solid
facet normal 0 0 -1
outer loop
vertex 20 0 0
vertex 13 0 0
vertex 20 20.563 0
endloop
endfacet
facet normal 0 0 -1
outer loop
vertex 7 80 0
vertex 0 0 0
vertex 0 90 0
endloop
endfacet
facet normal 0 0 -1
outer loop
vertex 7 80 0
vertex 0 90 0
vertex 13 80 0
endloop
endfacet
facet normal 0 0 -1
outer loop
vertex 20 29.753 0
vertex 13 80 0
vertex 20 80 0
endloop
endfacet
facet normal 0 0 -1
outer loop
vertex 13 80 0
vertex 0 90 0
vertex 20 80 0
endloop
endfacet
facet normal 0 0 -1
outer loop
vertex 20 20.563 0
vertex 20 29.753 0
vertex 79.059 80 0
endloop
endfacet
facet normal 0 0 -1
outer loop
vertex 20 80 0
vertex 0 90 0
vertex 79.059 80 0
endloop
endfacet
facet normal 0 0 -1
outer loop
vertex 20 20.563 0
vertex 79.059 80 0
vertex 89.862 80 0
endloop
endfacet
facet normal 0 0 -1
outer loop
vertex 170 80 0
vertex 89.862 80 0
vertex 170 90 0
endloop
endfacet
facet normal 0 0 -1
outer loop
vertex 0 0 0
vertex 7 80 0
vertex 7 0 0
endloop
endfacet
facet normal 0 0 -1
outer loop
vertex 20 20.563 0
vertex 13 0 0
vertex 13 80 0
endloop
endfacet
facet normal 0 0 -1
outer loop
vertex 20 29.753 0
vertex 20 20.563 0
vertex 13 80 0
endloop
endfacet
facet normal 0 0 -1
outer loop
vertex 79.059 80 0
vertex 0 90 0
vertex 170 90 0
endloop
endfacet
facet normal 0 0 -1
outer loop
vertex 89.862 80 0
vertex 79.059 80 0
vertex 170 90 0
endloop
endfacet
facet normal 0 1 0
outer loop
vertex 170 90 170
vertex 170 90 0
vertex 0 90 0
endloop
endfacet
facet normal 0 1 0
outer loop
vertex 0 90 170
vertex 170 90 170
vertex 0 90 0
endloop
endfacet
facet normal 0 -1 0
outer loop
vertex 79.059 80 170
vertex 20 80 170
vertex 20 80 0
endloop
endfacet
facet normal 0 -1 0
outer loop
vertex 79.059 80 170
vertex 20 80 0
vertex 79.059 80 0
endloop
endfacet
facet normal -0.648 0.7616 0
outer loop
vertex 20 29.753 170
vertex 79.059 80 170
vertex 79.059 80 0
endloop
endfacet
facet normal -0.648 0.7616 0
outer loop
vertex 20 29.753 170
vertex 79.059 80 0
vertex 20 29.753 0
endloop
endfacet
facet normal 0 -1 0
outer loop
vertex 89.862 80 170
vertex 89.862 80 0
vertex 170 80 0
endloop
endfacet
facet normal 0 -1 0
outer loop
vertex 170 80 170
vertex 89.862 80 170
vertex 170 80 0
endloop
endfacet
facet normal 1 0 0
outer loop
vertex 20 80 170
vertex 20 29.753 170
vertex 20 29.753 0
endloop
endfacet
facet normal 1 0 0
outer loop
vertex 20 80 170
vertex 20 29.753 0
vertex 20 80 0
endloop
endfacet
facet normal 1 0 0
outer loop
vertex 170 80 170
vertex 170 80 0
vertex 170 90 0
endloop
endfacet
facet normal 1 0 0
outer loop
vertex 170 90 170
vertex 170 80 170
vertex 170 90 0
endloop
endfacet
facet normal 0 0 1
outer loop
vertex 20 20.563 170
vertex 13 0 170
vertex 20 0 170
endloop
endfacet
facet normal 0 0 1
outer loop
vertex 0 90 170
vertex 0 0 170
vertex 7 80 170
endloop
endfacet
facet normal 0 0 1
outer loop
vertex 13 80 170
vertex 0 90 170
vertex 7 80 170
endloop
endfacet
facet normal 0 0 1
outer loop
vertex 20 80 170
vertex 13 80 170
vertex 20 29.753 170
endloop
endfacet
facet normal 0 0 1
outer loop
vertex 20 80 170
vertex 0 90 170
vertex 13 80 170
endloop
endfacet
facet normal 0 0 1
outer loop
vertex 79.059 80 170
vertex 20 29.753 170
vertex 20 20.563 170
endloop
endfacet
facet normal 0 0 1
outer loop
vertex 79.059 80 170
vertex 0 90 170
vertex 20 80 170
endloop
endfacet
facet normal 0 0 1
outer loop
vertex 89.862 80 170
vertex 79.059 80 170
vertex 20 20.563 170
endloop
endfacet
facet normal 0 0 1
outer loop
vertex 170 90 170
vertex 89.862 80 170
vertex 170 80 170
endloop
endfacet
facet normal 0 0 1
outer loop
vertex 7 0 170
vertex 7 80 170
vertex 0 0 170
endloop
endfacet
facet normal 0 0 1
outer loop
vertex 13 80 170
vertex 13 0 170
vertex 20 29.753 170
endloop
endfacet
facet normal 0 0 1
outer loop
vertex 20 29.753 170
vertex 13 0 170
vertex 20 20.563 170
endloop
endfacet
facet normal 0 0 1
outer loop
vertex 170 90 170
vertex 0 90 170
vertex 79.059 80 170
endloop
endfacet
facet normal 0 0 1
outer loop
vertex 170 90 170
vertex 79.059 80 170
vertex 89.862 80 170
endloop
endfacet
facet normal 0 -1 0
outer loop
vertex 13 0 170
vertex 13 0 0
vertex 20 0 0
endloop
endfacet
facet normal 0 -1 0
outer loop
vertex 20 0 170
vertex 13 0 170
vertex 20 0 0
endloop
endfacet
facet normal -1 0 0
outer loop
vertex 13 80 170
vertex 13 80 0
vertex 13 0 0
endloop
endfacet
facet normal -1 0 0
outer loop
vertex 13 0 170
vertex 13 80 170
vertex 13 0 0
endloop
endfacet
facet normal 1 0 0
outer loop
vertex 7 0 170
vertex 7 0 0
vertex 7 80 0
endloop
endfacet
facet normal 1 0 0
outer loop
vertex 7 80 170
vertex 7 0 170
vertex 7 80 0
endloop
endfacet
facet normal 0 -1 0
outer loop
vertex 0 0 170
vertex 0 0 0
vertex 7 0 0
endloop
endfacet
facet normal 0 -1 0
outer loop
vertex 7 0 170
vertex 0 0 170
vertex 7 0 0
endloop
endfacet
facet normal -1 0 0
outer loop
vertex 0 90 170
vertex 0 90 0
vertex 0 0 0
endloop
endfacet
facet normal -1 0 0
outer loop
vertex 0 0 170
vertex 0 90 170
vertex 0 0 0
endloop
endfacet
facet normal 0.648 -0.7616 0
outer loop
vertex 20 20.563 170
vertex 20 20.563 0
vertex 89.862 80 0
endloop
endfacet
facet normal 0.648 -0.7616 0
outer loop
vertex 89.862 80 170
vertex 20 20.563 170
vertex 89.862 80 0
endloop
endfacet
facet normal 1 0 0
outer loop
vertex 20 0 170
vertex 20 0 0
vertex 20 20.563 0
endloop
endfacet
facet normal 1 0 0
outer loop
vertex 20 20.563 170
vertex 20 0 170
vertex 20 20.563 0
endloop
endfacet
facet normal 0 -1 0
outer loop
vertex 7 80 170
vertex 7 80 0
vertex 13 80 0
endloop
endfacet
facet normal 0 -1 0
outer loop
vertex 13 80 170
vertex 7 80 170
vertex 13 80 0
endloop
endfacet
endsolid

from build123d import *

# Parameters (mm, degrees)
BOSS_EXTRU_1_DEPTH      = 170
ENL_V_MAT_EXTRU_1_DEPTH = 257.70995306


with BuildPart() as part:
    # Esquisse1 → Boss.-Extru.1 (new body)
    with BuildSketch(Plane.XY):
        Polygon((0, 90), (0, 0), (7, 0), (7, 80), (13, 80), (13, 0), (20, 0), (20, 20.562593983), (89.86150576, 80), (170, 80), (170, 90), align=None)
    extrude(amount=BOSS_EXTRU_1_DEPTH)

    # Esquisse3 → Enlèv. mat.-Extru.1 (cut, through all)
    with BuildSketch(Plane.XY.offset(170)):
        Polygon((20, 80), (79.058990958, 80), (20, 29.753255583), align=None)
    extrude(amount=-ENL_V_MAT_EXTRU_1_DEPTH, mode=Mode.SUBTRACT)


solid = part.part
